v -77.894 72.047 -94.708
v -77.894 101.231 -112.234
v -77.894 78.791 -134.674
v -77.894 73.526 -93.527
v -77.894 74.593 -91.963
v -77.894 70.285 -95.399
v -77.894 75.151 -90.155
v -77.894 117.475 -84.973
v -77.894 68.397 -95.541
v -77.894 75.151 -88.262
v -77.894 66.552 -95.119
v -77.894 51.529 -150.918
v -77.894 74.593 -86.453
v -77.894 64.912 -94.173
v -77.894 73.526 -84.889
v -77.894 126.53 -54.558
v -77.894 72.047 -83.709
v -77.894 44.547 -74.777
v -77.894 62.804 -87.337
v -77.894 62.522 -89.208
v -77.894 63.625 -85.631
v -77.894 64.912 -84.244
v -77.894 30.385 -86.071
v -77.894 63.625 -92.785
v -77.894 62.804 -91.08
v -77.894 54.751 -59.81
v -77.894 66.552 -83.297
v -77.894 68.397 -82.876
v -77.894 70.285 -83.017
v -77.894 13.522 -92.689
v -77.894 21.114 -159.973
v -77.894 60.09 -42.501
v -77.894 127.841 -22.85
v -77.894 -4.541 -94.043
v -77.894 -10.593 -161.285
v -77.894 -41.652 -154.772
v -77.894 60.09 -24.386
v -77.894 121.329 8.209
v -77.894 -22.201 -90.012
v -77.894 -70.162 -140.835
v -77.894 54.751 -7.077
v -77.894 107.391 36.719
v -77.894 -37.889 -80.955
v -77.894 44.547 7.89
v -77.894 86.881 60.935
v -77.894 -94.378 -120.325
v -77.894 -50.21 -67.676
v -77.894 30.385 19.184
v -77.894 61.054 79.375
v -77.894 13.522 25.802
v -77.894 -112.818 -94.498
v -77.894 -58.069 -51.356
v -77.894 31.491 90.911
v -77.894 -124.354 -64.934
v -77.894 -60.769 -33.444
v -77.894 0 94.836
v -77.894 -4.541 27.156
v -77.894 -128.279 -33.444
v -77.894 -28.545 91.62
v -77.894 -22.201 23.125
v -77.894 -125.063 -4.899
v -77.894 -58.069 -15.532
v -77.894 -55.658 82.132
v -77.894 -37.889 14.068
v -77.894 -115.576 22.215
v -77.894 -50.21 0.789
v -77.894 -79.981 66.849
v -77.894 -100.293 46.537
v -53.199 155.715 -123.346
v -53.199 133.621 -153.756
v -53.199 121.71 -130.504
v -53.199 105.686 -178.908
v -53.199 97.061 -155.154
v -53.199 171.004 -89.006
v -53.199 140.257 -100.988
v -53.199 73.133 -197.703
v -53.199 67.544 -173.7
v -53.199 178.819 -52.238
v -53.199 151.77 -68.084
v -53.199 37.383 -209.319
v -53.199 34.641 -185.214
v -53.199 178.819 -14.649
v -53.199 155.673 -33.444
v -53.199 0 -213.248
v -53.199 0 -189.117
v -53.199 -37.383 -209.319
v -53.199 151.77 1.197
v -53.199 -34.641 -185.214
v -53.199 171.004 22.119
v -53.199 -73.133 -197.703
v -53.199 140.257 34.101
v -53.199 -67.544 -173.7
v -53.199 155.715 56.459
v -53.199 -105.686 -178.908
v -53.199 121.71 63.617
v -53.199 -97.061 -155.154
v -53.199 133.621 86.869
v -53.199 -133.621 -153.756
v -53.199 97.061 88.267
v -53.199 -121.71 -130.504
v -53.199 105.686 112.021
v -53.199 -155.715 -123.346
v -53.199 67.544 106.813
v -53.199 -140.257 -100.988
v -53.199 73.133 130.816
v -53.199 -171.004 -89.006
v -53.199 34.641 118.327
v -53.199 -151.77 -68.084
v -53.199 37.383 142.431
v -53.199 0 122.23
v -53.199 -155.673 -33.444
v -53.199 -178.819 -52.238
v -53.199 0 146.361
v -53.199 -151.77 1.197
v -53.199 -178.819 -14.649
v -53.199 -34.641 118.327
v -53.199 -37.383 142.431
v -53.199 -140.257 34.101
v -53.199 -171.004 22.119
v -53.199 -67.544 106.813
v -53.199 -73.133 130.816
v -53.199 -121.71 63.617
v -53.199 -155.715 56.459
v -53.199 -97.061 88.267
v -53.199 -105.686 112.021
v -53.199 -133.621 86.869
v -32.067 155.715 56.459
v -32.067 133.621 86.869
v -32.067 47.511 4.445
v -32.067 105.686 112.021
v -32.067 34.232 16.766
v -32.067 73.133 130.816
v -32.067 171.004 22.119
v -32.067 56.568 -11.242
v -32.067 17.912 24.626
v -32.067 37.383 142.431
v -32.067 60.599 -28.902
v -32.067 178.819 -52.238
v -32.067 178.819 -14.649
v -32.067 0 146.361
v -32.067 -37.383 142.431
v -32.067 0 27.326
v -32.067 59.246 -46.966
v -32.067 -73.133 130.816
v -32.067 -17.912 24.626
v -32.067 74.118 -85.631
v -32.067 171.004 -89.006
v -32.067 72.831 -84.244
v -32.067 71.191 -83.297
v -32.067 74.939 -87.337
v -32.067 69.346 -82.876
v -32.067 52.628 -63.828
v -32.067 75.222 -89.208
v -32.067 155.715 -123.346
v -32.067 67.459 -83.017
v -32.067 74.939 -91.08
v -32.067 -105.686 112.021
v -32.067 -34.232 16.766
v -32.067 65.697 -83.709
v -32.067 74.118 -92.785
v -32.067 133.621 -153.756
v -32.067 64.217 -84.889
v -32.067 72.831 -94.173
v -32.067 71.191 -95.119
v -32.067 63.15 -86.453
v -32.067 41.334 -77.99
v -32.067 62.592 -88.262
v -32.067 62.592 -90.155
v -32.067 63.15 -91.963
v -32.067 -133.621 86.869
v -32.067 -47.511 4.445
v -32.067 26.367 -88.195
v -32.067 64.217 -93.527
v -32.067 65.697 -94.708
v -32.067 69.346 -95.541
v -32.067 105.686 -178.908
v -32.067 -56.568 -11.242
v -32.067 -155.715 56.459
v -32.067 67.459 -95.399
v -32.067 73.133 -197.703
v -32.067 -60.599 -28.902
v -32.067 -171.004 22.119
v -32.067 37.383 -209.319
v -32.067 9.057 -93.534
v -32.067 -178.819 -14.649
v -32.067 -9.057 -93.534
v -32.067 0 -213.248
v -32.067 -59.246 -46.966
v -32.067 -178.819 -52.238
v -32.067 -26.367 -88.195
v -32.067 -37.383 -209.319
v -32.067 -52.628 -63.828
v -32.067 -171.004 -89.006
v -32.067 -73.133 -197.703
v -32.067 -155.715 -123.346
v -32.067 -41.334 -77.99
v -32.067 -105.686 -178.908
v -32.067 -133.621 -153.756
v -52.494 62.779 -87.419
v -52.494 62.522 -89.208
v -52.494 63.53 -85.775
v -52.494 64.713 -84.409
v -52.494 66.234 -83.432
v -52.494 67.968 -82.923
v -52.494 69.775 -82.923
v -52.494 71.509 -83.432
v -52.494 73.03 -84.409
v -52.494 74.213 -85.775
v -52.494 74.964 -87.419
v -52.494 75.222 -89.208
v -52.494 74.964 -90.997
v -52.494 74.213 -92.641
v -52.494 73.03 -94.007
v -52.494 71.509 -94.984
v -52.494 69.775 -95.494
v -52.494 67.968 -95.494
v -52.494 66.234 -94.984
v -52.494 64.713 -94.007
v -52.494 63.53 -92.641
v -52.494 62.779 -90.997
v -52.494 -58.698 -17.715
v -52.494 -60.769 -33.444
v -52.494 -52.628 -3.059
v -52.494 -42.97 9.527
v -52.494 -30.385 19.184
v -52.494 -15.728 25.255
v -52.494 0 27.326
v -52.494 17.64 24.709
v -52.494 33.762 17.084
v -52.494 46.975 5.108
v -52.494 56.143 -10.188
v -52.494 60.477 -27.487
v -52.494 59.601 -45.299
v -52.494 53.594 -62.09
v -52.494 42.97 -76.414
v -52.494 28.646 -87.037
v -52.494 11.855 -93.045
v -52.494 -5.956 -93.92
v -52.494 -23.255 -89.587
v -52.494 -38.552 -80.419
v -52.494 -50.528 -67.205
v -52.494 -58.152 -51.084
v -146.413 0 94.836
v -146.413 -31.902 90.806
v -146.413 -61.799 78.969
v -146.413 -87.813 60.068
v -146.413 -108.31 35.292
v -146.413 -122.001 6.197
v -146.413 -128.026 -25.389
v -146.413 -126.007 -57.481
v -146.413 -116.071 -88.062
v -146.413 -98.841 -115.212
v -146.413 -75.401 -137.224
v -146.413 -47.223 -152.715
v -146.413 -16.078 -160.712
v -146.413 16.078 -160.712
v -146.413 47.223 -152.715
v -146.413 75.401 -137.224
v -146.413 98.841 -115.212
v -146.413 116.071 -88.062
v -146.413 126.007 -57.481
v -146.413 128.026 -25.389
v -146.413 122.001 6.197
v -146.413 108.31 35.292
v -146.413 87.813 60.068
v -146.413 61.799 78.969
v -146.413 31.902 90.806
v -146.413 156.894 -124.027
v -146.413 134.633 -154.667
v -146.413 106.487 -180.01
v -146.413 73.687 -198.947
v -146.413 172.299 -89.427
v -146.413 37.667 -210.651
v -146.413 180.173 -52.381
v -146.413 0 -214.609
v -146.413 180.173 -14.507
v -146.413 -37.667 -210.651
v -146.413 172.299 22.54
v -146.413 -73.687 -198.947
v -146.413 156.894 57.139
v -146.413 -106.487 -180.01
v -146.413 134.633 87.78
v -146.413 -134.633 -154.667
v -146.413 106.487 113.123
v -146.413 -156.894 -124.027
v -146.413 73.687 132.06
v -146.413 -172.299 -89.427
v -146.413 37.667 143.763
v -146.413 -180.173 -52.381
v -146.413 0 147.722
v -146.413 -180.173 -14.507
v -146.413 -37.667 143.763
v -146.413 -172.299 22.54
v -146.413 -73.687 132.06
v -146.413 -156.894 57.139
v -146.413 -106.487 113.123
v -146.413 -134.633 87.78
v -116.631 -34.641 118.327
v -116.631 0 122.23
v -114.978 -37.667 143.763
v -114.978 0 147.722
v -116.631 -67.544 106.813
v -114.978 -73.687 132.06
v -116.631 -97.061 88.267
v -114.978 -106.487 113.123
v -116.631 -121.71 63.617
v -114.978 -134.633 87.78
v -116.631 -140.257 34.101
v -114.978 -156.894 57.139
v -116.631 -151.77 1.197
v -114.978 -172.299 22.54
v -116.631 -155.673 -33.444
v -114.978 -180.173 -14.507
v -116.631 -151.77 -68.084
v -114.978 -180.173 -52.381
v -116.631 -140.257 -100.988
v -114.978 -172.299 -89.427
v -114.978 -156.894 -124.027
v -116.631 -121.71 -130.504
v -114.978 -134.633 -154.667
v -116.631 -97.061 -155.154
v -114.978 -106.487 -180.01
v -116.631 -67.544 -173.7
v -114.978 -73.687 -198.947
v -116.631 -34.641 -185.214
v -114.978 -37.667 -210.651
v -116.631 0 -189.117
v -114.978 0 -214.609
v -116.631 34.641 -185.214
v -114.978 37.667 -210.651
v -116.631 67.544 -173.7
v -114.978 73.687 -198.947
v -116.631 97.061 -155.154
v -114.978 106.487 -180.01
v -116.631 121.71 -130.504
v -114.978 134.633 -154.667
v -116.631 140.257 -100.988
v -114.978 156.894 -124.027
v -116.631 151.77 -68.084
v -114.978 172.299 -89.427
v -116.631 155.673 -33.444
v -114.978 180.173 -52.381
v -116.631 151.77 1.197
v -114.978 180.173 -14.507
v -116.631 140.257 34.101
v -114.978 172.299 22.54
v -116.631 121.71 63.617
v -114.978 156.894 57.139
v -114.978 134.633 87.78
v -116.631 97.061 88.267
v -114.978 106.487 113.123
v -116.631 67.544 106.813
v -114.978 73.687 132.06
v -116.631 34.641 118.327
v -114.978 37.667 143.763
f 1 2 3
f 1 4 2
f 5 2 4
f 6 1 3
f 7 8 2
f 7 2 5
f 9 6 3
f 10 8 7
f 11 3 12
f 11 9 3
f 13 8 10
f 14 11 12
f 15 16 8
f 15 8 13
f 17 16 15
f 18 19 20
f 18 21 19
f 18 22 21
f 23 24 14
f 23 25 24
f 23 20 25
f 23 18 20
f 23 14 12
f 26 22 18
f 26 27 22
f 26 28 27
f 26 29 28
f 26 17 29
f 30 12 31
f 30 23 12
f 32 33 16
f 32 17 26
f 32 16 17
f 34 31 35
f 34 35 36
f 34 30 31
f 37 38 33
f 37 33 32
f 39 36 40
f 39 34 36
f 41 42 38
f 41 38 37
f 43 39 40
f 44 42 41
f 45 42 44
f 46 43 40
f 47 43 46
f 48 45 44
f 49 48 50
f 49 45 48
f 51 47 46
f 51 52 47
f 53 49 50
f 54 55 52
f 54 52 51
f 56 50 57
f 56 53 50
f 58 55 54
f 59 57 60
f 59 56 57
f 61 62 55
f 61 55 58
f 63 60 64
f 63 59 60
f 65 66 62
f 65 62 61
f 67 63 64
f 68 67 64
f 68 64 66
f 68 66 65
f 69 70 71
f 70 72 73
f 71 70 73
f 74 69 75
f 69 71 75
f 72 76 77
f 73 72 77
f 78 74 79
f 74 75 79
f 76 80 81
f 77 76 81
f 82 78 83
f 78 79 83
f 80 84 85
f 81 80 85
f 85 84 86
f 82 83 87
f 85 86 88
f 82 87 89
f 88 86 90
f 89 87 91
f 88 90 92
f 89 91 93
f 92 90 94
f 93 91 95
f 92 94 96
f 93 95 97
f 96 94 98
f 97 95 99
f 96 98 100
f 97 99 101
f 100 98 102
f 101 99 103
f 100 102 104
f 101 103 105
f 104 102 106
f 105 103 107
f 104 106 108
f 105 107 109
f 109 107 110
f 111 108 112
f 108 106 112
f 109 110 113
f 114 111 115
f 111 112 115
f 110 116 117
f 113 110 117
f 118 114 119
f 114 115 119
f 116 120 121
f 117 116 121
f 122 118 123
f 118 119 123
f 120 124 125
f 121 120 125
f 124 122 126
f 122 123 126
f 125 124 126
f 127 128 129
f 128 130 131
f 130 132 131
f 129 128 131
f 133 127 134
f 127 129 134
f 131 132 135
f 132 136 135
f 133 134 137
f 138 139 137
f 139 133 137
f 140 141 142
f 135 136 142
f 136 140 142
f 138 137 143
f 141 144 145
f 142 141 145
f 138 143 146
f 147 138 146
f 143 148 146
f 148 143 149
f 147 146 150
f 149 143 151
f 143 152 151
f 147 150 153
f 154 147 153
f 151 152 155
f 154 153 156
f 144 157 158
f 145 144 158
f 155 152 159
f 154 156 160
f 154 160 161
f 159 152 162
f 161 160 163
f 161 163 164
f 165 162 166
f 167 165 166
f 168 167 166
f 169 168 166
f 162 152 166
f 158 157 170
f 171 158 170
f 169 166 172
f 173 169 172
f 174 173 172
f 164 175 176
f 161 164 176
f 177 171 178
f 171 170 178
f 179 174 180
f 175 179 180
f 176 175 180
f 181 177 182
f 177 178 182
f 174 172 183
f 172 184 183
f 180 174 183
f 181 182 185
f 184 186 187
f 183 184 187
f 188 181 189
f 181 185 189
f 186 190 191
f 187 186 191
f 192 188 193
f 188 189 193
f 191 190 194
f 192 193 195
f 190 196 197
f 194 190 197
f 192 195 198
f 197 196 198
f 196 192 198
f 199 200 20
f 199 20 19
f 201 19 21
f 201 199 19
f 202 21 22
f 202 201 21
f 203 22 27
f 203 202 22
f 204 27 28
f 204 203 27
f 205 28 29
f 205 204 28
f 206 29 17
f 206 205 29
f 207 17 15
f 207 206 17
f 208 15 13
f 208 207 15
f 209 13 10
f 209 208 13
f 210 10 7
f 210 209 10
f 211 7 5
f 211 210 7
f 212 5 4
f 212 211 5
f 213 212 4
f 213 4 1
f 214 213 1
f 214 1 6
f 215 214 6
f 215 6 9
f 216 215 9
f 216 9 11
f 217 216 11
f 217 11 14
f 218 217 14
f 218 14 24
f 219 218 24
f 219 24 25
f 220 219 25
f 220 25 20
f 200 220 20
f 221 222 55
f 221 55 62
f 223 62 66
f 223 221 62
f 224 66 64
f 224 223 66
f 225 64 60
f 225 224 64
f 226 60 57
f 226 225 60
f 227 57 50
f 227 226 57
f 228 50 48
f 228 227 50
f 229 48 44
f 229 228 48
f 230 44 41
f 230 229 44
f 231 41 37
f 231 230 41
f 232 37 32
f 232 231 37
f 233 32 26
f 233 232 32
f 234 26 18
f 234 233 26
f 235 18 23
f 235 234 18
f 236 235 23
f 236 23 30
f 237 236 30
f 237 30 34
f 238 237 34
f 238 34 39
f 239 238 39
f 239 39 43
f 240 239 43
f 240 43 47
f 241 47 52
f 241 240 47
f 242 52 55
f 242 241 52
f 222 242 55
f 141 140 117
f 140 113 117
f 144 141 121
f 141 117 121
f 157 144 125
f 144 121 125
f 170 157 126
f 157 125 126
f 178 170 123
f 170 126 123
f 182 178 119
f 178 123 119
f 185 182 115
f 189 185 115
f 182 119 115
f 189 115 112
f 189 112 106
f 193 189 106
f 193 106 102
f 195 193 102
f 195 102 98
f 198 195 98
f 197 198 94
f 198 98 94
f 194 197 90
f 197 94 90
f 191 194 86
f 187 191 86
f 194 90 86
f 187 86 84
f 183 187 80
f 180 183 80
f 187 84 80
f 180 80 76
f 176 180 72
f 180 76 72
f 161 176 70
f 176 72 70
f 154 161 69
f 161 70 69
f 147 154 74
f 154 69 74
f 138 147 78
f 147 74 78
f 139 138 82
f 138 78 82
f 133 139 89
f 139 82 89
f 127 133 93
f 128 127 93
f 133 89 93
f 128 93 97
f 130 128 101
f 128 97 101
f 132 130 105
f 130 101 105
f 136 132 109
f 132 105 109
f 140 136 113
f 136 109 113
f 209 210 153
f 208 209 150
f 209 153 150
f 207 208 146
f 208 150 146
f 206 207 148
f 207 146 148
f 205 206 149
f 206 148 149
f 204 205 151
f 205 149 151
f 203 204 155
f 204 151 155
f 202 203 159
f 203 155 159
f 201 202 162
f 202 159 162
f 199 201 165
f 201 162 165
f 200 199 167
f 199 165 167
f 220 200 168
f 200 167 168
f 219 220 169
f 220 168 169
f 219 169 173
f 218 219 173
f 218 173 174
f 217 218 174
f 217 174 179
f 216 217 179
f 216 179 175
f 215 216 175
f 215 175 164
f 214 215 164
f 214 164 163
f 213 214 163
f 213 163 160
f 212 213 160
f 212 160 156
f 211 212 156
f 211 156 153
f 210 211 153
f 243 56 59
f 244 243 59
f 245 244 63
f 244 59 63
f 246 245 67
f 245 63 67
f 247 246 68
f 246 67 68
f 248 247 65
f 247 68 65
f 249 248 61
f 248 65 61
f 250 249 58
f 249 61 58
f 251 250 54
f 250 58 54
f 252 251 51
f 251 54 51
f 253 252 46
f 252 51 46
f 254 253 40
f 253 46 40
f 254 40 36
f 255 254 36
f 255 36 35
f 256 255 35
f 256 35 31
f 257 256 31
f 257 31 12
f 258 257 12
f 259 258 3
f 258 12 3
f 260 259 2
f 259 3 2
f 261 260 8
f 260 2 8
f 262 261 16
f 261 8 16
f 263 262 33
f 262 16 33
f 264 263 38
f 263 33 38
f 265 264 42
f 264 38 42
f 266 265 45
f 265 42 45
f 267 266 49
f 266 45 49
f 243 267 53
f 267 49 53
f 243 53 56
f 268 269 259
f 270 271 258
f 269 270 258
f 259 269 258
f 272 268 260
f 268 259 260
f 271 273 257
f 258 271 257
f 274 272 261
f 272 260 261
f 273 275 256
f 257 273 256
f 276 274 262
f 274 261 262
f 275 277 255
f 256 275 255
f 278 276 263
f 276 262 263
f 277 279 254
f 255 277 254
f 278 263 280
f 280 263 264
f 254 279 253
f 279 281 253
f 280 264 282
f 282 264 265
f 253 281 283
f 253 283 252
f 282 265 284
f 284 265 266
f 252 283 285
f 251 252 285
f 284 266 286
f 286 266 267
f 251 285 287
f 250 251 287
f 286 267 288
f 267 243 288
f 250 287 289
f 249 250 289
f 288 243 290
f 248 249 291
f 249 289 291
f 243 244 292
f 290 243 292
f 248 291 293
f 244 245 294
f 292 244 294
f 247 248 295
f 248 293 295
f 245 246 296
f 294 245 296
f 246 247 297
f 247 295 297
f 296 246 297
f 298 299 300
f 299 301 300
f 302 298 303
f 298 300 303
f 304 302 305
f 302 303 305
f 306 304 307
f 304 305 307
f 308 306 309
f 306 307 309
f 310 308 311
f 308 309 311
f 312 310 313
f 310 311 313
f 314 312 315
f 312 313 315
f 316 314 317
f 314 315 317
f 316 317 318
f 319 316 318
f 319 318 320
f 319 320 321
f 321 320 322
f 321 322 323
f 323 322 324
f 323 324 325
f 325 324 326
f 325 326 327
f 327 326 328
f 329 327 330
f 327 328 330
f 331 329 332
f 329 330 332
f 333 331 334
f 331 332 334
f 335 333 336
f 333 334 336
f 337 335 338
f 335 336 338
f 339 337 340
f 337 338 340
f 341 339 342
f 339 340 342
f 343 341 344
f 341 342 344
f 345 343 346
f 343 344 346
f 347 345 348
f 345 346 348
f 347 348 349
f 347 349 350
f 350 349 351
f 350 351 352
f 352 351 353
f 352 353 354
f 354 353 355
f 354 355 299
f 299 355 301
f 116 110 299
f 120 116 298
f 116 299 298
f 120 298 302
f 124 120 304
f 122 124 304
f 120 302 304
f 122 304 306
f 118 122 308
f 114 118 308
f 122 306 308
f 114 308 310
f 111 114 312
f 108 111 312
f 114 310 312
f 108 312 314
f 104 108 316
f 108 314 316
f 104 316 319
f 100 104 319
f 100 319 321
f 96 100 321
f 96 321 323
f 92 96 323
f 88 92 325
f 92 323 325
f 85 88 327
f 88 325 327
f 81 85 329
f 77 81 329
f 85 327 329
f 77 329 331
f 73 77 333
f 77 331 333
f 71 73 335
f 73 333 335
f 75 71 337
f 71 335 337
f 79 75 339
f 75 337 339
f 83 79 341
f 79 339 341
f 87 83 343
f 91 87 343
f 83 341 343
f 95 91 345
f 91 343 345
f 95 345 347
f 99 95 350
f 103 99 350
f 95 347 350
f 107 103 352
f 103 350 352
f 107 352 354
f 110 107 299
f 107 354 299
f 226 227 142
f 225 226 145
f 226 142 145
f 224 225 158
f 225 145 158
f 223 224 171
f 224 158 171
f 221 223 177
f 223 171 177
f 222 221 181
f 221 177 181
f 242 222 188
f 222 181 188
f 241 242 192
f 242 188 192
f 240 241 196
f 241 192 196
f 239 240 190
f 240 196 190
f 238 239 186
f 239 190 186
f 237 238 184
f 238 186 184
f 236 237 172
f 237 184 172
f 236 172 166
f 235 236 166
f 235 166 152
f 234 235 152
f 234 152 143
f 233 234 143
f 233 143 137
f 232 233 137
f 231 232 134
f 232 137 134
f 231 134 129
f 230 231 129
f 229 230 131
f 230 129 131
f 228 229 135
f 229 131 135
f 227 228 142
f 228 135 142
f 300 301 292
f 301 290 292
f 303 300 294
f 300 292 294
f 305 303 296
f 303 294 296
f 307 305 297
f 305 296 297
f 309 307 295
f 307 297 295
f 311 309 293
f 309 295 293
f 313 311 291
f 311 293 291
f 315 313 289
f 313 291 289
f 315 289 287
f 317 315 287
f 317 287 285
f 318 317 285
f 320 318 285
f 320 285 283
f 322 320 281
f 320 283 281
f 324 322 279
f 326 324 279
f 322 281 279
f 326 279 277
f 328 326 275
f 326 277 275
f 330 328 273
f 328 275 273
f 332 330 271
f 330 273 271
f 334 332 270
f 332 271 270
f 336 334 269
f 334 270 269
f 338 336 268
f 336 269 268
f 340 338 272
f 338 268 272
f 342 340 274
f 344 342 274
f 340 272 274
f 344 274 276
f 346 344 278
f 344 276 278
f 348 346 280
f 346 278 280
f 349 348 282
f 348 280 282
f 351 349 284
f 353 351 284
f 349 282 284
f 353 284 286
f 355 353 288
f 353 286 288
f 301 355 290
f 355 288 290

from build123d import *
from build123d import SkipClean  # not in build123d's __all__

# Parameters (mm, degrees)
F4_D     = 12.7
F5_R     = 128.2794587314
F5_R_2   = 6.35
F5_R_3   = 60.7691295445
F6_DEPTH = 25.4


with BuildPart() as f2:
    # F0 (on Front) → F2 (revolve)
    with BuildSketch(Plane.XZ):
        Polygon((-52.4943843484, 27.3255631328), (-32.0674665272, 27.3255631328), (-32.0674665272, 113.4814321995), (-32.0674665272, 146.3606357574), (-53.1988926232, 146.3606357574), (-53.1988926232, 122.2296878695), (-116.6306659579, 122.2296878695), (-114.9781197309, 147.7223485708), (-146.413102746, 147.7223485708), (-146.413102746, 94.8358923197), (-52.4943843484, 94.8358923197), align=None)
    revolve(axis=Axis((-79.9387739971, 0, -33.4435664117), (1, 0, 0)))

    # F4 (through all)
    with Locations(Plane(origin=(-52.4943843484, 0, 0), x_dir=(0, -1, 0), z_dir=(-1, 0, 0))):
        with Locations((-68.8715130091, -89.2082676291)):
            Hole(F4_D / 2)

    # F5 (on face) → F6 (join)
    with BuildSketch(Plane(origin=(-52.4943843484, 0, 0), x_dir=(0, -1, 0), z_dir=(-1, 0, 0))):
        with Locations((0, -33.4435664117)):
            Circle(F5_R)
        with Locations((-68.8715130091, -89.2082676291)):
            Circle(F5_R_2, mode=Mode.SUBTRACT)
        with Locations((0, -33.4435664117)):
            Circle(F5_R_3, mode=Mode.SUBTRACT)
    with SkipClean():  # cleaning this boolean's faces spoils the solid; the shape is the same uncleaned
        extrude(amount=F6_DEPTH)


solid = f2.part
